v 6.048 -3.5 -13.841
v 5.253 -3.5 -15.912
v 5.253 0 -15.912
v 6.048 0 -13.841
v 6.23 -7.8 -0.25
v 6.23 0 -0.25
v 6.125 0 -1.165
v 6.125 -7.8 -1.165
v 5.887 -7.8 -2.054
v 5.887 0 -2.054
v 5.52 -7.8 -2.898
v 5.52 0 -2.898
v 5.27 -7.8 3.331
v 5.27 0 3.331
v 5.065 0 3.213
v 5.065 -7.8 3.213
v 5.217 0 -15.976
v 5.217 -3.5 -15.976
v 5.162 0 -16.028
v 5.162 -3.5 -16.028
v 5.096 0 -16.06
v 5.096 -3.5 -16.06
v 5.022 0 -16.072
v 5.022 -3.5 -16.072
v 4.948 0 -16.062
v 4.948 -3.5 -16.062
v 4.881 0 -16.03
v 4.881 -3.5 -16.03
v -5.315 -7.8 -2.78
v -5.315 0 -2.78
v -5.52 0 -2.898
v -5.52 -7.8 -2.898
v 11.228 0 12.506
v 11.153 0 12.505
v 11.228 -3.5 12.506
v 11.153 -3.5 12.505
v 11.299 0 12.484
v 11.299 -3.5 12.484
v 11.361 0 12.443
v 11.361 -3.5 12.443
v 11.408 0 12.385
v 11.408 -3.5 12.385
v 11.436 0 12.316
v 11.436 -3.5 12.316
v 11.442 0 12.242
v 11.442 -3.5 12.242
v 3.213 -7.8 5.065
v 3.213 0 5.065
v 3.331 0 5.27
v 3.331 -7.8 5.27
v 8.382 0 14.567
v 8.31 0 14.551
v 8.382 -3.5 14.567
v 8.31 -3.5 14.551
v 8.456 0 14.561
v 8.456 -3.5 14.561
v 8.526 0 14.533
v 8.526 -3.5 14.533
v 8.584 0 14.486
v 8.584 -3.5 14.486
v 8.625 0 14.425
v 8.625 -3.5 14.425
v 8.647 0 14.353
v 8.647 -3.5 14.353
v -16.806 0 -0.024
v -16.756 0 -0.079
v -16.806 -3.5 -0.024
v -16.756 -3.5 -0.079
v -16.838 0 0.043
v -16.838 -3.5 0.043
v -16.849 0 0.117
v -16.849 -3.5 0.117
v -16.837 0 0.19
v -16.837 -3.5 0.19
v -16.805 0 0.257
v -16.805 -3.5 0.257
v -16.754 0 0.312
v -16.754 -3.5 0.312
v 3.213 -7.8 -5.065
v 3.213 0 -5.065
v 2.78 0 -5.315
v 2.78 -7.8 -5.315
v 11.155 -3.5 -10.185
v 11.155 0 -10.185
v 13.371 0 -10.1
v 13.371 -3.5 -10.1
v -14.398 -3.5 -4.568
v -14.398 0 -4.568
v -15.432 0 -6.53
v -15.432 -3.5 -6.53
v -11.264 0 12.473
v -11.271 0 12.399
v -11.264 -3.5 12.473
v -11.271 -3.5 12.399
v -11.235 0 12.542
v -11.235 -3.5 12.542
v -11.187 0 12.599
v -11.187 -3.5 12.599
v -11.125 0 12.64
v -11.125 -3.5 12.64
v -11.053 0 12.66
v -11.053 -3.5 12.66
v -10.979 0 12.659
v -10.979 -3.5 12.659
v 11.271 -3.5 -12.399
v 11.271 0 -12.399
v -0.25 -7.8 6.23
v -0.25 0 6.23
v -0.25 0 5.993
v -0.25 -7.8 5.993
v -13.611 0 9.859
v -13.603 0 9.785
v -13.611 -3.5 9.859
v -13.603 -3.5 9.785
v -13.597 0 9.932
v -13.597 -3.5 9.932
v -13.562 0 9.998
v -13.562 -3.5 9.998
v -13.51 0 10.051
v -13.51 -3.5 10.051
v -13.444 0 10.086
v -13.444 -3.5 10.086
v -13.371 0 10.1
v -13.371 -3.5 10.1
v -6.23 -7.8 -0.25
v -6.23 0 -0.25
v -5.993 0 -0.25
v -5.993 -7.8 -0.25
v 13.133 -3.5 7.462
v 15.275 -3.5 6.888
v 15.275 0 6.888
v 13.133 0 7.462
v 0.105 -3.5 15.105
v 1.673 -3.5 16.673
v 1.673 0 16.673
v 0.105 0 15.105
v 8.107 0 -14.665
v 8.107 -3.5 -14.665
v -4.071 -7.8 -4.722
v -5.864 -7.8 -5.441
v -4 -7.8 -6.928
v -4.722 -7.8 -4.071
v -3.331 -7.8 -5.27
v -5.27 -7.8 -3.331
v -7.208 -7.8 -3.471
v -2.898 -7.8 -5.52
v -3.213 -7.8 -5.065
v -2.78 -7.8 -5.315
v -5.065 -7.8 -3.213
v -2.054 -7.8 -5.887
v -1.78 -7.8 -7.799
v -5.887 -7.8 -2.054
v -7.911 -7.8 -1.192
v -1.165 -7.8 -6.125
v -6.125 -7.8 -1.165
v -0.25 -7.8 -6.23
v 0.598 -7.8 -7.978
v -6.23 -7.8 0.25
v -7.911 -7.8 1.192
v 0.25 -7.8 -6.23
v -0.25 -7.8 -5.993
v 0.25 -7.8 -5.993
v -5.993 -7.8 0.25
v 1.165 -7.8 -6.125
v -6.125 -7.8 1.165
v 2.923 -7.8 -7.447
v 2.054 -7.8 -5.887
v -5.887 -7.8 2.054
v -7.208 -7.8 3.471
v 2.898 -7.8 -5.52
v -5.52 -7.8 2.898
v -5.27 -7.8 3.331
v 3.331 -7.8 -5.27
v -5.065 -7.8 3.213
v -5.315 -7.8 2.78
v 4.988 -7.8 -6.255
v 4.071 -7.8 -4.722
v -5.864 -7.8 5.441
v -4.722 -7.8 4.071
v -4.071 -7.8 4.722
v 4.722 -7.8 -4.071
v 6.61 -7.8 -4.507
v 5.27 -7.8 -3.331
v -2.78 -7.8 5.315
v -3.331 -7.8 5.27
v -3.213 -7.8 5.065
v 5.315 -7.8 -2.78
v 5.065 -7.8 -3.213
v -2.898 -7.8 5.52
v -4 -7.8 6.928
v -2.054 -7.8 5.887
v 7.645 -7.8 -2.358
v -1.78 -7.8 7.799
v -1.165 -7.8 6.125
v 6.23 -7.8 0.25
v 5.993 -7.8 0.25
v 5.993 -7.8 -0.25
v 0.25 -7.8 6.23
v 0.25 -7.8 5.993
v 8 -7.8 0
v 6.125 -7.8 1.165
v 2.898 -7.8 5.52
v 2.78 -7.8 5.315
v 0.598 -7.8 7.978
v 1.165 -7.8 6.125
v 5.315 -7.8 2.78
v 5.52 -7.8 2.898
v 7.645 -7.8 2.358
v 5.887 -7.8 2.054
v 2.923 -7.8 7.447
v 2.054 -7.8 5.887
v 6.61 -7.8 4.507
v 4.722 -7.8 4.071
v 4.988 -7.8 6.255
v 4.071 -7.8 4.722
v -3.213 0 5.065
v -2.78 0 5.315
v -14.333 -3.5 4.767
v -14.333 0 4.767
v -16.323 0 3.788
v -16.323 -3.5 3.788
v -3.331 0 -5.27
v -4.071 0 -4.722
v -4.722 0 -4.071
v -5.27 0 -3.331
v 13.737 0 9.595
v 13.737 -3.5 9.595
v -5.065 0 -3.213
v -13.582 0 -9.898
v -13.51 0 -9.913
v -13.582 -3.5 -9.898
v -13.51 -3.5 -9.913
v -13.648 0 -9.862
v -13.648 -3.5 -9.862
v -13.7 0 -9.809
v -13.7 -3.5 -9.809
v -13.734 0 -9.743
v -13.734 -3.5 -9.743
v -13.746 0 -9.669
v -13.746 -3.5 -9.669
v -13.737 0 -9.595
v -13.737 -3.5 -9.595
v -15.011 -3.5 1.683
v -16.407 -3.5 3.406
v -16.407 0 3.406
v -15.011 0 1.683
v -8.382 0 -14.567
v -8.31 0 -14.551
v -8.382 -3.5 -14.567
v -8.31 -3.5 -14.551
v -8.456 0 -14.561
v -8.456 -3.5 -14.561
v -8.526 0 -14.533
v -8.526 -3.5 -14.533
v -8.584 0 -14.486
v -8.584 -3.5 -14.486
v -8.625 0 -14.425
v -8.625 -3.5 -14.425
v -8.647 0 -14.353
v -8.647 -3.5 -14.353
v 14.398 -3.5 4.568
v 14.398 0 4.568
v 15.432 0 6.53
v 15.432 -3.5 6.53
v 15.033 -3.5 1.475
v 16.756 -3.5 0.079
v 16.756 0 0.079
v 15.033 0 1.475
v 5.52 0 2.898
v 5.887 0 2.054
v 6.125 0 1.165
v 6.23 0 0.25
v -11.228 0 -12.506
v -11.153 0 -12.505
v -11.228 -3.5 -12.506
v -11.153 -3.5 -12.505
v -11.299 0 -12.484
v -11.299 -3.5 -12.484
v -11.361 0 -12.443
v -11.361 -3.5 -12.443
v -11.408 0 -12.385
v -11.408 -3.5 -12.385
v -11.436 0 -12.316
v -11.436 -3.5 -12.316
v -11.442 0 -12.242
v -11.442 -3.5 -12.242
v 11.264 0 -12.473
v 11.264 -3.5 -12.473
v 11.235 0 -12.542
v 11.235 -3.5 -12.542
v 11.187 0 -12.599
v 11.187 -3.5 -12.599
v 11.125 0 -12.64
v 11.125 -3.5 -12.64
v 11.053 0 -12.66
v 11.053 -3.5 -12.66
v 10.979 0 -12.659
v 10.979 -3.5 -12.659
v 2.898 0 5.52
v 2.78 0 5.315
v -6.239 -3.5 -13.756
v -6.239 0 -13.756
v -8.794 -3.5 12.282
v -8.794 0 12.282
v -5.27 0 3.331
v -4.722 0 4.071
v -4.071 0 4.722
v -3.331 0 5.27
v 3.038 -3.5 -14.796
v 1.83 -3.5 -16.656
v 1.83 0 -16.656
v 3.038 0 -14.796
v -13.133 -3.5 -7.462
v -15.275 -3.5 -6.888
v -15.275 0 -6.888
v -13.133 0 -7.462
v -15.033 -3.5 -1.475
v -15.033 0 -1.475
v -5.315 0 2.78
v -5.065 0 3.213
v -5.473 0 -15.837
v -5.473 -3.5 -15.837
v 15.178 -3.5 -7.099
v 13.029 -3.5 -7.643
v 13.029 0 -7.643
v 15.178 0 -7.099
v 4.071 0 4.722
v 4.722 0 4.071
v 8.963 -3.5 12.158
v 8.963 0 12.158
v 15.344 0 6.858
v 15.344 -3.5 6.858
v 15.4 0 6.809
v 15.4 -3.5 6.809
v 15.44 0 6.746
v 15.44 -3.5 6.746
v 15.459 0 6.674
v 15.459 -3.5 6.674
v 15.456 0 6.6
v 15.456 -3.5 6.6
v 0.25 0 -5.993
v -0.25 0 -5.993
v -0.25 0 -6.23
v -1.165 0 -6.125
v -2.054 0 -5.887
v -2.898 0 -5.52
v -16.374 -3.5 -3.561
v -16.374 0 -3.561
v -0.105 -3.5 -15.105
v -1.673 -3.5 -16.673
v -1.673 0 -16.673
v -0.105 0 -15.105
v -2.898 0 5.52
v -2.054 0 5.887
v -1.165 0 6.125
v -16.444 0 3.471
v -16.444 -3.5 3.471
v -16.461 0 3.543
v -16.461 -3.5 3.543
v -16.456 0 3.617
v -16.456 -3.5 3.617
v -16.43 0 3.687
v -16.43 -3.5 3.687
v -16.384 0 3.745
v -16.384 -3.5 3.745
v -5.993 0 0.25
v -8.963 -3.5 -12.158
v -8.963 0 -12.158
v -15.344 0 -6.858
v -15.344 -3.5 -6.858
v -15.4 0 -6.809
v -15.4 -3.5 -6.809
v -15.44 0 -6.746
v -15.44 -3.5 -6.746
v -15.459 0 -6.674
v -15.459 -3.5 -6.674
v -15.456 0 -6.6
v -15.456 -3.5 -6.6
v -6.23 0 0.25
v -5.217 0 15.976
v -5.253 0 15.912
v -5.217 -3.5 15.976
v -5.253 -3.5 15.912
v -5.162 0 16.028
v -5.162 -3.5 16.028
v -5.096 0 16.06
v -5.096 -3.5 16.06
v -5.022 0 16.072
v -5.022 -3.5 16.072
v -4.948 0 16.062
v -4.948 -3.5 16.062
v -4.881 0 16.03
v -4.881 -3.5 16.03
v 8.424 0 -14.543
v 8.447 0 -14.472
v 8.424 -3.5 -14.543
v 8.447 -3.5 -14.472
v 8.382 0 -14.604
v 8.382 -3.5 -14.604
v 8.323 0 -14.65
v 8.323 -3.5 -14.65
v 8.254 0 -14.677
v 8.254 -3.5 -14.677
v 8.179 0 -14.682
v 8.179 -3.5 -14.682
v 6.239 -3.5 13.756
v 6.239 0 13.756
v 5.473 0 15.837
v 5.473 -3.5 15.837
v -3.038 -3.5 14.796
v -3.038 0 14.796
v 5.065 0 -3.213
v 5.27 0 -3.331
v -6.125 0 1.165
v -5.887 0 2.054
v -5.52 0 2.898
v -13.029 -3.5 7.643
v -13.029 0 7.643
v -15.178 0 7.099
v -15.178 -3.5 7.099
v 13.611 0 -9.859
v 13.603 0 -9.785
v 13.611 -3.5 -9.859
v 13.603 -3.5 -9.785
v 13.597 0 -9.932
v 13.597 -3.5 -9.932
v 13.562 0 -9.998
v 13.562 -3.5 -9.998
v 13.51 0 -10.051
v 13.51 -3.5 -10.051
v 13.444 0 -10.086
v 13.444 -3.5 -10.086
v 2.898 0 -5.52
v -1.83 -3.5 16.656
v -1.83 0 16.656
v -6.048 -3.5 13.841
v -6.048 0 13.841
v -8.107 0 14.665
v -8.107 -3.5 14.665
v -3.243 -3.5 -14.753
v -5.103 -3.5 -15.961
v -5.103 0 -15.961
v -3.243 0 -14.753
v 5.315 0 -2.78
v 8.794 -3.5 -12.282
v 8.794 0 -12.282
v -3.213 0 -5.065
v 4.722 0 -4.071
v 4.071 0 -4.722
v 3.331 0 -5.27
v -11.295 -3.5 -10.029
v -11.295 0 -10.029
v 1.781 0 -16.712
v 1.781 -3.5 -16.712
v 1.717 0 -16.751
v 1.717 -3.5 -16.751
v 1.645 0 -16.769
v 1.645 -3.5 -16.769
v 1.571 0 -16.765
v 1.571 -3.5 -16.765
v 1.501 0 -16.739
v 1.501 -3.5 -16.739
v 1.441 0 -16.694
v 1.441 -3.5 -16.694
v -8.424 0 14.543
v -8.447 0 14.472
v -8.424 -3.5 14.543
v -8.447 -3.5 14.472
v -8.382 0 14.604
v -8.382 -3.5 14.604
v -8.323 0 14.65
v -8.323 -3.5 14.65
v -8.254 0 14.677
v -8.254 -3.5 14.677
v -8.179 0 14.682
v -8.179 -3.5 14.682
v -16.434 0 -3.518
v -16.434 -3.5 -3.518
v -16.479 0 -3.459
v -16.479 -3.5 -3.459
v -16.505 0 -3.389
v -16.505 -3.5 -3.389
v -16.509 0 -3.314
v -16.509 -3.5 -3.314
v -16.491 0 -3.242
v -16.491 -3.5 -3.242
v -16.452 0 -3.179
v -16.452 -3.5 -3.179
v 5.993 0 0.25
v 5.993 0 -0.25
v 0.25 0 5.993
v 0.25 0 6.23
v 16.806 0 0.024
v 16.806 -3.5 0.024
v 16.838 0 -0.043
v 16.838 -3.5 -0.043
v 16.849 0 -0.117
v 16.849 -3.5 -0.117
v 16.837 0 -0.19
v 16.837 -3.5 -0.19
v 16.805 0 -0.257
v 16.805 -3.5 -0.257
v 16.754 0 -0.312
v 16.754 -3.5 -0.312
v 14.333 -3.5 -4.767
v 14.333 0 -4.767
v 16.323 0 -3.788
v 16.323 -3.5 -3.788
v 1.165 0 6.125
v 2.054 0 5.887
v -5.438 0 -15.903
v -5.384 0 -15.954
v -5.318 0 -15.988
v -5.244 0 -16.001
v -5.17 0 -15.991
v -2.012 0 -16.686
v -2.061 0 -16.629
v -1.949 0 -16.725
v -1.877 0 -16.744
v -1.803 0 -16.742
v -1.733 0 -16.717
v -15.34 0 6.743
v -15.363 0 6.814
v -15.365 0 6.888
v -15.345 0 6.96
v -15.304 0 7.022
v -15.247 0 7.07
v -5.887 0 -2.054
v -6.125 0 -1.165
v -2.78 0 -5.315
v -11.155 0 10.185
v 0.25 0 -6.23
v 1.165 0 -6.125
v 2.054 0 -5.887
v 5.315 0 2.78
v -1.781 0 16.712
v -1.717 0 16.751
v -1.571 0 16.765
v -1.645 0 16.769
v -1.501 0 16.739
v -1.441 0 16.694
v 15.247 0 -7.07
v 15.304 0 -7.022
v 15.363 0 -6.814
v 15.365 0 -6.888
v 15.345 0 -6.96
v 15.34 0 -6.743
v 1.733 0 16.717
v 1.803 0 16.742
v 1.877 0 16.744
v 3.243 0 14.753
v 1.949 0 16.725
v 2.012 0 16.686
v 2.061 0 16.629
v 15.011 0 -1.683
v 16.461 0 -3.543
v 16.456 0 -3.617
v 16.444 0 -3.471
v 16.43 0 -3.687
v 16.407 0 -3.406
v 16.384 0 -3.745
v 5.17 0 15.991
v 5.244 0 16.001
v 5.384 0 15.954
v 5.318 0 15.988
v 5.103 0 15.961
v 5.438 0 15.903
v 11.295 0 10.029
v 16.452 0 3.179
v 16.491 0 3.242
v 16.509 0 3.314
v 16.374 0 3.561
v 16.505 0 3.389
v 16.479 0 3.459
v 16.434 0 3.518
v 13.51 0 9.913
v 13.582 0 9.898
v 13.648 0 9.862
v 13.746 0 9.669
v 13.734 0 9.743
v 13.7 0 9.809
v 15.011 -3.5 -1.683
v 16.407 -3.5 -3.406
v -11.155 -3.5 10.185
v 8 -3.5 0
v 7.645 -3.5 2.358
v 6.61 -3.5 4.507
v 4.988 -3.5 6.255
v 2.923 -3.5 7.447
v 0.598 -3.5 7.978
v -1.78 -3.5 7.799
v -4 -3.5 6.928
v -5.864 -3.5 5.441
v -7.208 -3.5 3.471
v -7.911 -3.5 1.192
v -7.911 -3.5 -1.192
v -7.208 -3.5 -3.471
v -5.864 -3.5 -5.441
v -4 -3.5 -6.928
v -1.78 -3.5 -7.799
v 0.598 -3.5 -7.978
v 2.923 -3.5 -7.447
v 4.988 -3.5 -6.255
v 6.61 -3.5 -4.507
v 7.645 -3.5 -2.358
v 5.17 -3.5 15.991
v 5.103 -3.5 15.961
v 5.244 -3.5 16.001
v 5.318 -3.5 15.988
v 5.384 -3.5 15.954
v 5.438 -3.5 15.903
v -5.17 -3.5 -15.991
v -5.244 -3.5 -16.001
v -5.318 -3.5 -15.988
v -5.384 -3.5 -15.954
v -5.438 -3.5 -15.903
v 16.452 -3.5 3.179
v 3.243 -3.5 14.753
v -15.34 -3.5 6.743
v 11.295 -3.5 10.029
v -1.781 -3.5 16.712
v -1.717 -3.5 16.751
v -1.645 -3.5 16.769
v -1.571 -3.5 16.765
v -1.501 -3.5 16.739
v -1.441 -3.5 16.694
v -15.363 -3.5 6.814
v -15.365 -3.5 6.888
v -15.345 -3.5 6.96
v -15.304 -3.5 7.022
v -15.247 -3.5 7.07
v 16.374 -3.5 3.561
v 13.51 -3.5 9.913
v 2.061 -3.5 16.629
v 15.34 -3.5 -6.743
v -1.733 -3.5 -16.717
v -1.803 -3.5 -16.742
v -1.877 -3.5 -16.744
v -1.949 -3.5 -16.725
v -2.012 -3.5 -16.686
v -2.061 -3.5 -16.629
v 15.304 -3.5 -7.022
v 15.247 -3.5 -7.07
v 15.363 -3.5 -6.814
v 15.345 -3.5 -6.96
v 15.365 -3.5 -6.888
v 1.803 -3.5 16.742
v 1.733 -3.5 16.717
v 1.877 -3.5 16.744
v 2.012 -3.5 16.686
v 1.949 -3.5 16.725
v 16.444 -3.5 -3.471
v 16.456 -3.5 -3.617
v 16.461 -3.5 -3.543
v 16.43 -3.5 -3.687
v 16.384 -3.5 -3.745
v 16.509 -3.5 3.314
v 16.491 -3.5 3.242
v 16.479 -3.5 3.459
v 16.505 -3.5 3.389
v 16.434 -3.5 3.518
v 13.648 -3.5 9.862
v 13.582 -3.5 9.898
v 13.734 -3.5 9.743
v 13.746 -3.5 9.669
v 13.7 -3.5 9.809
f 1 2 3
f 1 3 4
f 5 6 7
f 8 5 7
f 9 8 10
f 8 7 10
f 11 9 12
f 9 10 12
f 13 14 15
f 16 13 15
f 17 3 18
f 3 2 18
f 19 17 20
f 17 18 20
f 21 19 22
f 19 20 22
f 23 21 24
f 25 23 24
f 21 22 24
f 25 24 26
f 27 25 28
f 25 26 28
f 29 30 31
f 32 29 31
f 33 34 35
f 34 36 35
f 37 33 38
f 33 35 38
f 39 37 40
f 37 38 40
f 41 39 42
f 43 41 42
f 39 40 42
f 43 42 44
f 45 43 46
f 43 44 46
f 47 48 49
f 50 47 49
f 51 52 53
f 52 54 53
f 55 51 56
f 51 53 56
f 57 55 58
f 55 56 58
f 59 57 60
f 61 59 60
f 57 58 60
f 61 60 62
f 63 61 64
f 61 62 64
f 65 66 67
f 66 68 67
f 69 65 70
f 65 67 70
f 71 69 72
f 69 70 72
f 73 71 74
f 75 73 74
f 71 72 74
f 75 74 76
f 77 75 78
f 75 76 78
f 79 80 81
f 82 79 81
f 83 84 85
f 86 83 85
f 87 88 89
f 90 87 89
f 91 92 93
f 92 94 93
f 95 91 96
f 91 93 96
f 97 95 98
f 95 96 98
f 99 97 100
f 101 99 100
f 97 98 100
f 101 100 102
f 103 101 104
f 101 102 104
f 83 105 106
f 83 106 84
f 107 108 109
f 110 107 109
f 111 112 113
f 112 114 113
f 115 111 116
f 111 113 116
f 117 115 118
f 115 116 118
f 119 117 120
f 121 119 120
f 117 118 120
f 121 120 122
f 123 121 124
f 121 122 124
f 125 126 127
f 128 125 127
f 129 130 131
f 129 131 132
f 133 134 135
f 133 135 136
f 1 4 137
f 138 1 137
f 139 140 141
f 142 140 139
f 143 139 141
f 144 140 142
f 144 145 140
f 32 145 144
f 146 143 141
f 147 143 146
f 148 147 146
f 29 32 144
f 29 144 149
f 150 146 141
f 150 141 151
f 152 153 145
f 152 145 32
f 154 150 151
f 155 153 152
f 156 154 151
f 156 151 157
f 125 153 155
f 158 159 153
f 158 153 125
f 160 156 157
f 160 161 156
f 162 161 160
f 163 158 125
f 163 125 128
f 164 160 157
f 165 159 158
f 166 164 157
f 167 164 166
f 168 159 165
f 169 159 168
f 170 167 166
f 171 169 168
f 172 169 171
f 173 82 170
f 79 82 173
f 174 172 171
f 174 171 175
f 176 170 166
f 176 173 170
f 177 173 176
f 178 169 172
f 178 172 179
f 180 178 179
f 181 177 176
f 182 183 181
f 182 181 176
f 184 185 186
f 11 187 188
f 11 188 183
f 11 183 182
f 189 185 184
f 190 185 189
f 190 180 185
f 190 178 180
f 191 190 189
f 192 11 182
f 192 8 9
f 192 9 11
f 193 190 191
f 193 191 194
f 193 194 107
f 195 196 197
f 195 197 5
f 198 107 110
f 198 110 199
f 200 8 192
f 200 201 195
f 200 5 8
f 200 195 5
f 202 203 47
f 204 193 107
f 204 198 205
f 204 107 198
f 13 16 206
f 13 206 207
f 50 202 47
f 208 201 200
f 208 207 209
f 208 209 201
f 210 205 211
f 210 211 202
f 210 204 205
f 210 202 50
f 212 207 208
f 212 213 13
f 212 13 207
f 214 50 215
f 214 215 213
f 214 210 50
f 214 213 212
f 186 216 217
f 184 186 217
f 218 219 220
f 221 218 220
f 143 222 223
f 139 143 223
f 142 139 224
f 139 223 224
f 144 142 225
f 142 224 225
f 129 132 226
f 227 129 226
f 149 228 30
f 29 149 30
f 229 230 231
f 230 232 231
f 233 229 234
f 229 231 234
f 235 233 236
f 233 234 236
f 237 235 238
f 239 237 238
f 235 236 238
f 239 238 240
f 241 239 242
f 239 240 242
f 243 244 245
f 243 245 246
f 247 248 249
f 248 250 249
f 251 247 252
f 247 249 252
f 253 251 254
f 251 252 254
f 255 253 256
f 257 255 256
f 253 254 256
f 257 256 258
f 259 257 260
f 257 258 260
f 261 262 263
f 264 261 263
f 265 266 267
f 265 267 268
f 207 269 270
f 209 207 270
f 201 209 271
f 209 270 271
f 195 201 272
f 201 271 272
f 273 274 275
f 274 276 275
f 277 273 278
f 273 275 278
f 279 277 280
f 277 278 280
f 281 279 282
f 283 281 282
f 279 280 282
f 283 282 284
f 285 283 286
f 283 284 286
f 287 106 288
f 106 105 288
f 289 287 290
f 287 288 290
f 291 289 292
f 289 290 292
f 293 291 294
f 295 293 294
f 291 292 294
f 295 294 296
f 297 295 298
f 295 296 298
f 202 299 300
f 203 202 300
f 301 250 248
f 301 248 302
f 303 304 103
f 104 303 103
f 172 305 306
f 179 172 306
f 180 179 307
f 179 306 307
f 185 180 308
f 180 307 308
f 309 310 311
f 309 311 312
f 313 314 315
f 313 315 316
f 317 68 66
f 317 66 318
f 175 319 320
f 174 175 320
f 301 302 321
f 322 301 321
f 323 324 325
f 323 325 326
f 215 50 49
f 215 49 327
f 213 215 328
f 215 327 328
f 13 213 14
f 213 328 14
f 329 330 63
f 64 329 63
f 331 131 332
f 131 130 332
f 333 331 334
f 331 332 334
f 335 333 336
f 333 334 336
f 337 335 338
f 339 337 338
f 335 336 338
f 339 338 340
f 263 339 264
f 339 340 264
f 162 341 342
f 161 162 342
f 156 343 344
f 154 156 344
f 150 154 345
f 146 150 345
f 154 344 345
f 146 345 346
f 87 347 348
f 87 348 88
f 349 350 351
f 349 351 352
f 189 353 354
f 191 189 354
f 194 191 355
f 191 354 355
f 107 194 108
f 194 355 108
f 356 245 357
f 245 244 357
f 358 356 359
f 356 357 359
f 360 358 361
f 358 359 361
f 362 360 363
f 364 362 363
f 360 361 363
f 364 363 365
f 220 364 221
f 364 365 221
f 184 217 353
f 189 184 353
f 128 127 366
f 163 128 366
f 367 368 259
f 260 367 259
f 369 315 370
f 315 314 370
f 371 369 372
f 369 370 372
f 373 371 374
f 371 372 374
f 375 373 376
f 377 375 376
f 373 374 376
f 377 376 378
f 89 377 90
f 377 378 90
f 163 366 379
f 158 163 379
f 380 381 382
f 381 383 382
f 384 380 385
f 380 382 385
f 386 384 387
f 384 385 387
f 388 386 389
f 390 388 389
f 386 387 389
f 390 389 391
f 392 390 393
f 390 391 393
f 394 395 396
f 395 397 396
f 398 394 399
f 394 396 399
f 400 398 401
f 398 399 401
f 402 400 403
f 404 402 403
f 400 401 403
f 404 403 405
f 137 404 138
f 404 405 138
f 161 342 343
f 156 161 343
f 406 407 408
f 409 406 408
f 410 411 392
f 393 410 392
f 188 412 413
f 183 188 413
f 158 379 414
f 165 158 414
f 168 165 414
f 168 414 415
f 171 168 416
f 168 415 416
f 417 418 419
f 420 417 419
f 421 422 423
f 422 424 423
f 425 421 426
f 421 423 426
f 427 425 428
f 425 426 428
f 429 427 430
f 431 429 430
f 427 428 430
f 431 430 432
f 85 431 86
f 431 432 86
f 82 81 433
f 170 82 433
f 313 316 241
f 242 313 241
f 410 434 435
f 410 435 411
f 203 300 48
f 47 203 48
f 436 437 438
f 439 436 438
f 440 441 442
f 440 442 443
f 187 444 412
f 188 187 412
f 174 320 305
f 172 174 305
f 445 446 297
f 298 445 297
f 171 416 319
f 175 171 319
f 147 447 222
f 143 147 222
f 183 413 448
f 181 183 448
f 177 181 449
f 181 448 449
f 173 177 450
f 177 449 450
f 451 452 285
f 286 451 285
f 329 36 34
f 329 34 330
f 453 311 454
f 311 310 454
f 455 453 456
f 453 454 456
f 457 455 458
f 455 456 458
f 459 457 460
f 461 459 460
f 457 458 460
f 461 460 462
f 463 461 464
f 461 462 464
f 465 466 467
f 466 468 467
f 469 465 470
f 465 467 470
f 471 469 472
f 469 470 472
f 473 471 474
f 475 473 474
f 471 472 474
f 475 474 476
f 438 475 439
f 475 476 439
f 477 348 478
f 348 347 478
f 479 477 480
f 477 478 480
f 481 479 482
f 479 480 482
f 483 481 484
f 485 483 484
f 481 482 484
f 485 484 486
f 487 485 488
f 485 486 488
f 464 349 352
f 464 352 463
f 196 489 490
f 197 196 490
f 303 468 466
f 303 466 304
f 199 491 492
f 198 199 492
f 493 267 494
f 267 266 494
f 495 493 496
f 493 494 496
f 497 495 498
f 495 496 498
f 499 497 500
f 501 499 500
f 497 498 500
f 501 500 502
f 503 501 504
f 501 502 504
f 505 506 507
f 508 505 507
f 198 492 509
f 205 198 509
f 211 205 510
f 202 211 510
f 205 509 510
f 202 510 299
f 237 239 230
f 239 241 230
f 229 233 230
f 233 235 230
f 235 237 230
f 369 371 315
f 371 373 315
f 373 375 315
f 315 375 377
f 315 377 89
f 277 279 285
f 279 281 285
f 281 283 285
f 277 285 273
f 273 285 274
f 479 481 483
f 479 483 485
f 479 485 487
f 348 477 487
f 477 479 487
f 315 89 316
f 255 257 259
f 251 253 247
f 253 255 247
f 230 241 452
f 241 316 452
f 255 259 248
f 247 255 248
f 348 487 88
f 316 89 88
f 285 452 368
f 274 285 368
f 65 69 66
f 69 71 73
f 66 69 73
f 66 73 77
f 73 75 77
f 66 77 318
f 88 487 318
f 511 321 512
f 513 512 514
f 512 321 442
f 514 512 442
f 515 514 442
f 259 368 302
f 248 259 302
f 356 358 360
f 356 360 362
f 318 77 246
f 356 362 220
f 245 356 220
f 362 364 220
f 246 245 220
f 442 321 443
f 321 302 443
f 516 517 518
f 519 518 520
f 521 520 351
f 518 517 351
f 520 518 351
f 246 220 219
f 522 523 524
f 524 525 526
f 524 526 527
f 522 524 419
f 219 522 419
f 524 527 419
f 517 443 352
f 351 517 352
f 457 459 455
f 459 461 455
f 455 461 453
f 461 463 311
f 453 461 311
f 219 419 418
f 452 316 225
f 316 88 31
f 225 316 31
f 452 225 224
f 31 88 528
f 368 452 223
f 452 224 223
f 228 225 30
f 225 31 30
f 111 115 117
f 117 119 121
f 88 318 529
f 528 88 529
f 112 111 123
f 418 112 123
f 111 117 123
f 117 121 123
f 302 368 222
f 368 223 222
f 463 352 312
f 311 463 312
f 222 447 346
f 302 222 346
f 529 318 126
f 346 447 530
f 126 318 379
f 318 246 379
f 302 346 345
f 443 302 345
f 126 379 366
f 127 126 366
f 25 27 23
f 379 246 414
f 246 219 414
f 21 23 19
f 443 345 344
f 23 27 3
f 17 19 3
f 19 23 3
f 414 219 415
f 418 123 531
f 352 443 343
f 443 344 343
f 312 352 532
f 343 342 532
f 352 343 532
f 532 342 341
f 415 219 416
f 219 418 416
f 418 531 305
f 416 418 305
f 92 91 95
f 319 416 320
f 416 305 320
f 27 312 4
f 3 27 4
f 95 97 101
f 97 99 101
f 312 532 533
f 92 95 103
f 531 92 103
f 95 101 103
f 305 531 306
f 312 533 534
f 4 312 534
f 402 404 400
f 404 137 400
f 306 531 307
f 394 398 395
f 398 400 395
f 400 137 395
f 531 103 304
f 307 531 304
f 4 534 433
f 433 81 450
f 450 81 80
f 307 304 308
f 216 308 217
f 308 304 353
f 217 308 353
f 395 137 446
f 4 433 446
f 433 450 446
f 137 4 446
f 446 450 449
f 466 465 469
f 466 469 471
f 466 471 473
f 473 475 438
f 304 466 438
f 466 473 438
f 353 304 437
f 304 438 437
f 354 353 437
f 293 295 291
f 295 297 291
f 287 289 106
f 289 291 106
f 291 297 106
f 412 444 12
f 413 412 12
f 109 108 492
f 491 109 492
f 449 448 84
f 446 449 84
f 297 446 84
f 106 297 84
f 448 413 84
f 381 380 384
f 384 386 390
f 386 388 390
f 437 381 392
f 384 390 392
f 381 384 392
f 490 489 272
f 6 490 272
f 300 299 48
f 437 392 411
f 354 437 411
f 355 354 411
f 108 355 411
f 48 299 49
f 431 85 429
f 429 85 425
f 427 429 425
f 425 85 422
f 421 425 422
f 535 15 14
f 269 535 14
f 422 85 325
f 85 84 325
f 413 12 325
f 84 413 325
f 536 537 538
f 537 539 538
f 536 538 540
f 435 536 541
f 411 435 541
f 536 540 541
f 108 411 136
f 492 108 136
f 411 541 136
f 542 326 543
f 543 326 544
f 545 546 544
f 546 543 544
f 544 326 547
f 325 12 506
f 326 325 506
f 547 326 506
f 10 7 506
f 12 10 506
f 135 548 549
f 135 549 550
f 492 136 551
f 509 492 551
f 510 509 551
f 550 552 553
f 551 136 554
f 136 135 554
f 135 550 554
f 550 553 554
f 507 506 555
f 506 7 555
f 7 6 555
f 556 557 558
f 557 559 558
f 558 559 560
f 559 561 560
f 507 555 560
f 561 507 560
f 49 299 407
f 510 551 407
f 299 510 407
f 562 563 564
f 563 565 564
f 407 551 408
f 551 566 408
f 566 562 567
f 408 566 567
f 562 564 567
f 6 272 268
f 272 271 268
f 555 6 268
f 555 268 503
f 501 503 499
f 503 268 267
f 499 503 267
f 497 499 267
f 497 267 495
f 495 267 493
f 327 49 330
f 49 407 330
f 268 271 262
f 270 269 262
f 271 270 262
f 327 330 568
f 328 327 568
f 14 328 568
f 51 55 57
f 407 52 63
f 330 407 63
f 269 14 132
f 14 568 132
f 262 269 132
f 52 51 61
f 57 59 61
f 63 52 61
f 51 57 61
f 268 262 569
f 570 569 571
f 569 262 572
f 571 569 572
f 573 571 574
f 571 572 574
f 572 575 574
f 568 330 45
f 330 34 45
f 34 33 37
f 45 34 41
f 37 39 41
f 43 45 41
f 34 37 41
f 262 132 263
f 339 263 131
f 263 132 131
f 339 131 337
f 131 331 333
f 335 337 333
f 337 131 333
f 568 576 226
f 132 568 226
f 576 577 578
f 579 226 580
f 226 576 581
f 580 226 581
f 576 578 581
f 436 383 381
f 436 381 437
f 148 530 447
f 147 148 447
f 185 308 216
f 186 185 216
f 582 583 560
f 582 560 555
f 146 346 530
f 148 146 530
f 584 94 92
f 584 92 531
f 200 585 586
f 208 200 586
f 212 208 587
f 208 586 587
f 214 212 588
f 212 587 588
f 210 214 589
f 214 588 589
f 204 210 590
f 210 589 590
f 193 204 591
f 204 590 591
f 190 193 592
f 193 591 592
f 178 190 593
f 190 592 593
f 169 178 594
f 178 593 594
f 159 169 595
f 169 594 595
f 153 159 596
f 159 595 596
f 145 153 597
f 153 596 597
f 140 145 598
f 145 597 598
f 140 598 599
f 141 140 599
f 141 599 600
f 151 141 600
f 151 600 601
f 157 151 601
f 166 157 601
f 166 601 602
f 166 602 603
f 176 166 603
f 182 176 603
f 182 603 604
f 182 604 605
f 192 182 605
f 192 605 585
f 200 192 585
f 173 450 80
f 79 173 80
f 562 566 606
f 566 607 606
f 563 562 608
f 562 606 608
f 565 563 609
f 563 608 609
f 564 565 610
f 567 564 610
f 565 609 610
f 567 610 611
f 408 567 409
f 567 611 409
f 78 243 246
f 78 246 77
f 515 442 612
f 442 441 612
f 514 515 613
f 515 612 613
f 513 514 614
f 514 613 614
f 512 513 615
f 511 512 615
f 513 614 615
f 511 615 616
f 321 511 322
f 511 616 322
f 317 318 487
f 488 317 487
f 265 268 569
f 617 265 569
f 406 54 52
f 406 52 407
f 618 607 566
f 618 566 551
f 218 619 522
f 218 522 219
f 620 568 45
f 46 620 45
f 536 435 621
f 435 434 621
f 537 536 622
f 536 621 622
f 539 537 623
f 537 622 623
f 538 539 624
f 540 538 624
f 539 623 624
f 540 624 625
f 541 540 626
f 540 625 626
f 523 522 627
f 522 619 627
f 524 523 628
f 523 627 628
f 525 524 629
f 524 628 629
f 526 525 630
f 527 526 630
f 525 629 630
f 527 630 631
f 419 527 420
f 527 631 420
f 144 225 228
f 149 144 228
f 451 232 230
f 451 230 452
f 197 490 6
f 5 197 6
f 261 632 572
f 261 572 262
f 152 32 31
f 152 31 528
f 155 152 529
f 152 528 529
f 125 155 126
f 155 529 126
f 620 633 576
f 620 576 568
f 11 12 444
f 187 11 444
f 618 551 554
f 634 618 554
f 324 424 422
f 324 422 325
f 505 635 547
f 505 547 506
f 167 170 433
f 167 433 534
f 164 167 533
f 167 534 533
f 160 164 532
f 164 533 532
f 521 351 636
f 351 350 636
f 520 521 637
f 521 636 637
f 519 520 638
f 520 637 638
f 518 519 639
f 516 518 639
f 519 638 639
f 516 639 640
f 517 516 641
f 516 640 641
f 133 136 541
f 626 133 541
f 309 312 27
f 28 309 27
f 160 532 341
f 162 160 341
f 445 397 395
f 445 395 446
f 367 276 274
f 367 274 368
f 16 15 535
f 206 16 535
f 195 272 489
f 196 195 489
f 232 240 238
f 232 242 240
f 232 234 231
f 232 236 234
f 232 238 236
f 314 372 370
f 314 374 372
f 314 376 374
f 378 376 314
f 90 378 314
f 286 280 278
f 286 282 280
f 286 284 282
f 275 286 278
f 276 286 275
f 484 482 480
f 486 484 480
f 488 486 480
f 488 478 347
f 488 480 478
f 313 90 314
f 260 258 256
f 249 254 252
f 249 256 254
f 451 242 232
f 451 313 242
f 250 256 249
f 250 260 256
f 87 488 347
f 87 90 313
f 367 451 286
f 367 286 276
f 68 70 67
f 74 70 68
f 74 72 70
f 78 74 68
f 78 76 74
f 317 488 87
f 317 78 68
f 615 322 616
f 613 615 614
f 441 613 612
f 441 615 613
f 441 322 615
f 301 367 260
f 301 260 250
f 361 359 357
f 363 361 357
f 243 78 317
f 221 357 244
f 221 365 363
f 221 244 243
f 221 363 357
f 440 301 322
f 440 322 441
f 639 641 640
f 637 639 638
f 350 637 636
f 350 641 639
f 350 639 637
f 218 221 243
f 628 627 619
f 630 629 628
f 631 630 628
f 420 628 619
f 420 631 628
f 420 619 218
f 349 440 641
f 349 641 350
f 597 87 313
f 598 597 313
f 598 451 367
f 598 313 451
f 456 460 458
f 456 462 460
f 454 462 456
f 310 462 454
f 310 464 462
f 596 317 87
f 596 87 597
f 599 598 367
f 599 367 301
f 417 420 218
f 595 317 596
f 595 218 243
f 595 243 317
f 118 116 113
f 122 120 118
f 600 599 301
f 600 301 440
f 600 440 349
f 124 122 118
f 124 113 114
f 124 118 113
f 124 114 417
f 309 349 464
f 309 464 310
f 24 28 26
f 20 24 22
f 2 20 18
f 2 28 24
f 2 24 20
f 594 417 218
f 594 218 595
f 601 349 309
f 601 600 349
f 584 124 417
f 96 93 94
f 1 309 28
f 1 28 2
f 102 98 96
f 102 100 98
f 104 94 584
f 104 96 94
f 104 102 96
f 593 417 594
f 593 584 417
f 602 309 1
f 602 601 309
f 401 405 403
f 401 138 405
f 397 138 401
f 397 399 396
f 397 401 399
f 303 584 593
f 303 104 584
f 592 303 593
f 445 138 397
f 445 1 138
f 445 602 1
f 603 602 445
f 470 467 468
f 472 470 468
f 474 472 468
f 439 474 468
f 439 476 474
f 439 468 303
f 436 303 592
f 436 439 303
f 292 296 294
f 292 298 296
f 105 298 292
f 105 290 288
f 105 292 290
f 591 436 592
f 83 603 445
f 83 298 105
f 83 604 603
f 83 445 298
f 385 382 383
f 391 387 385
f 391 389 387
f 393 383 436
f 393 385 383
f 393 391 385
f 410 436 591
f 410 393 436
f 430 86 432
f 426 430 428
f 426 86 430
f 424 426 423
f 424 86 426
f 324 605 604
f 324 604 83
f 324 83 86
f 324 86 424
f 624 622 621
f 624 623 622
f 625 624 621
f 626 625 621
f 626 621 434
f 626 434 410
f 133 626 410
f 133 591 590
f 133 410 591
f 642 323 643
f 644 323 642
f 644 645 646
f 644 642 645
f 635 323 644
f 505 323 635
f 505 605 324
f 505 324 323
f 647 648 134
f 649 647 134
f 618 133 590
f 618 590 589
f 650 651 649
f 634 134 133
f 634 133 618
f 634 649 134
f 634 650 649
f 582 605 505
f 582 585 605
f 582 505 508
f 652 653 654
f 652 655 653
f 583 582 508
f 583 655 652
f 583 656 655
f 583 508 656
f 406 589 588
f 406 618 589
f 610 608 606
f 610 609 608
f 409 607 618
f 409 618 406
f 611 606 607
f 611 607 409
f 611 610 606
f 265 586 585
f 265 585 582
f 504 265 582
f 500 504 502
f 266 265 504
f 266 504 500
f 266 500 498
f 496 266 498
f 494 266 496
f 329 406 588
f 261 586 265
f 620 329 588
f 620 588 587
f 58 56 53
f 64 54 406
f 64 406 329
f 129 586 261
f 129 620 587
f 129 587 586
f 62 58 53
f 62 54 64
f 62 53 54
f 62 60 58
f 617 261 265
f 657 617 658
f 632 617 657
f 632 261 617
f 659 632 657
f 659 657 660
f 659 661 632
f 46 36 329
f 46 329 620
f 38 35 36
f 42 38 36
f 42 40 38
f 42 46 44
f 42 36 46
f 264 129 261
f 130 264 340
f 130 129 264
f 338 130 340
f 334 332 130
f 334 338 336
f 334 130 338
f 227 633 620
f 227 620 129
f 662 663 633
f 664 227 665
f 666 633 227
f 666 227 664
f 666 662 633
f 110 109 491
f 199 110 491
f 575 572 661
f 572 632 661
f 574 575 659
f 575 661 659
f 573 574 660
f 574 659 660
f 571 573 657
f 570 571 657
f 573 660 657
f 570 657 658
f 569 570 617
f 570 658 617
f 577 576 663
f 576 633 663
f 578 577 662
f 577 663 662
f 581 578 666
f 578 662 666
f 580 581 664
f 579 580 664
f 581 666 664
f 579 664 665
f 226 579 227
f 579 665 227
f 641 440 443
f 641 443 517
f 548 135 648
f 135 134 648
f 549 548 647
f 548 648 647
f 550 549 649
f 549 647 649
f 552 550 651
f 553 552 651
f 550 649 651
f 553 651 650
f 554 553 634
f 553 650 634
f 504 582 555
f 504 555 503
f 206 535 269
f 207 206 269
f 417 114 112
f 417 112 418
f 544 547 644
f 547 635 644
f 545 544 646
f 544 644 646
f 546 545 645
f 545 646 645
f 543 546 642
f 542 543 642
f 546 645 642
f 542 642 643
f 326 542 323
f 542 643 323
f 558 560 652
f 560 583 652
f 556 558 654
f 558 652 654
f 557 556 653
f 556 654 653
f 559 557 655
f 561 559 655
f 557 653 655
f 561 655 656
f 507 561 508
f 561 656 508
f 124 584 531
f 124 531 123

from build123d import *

# Parameters (mm, degrees)
F0_R     = 8
F1_DEPTH = 7.8
F0_R_2   = 15
F2_DEPTH = 3.5
F3_DEPTH = 7.8
F4_COUNT = 12
F6_DEPTH = 3.5
F8_R     = 0.25
F9_COUNT = 30


with BuildPart() as f1:
    # F0 (on Front) → F1 (new body)
    with BuildSketch(Plane.XZ):
        Circle(F0_R)
        with BuildLine():
            ThreePointArc((0.25, 6.229985955), (4.4963304483, 4.3195182023), (6.235, 0))
            ThreePointArc((6.235, 0), (-4.3195182023, -4.4963304483), (-0.25, 6.229985955))
            ThreePointArc((-0.25, 6.229985955), (0, 6.235), (0.25, 6.229985955))
        make_face(mode=Mode.SUBTRACT)
    extrude(amount=F1_DEPTH)

    # F0 (on Front) → F2 (join)
    with BuildSketch(Plane.XZ):
        Circle(F0_R_2)
        Circle(F0_R, mode=Mode.SUBTRACT)
    extrude(amount=F2_DEPTH)

    # F4: F3 ×12 about axis
    f4_axis = Axis((0, 0, 0), (0, -1, 0))


with BuildPart() as f3:
    # F0 (on Front) → F3 (new body)
    with BuildSketch(Plane.XZ):
        with BuildLine():
            Line((0.25, 5.993085955), (0.25, 6.229985955))
            ThreePointArc((0.25, 6.229985955), (0, 6.235), (-0.25, 6.229985955))
            Line((-0.25, 6.229985955), (-0.25, 5.993085955))
            Line((-0.25, 5.993085955), (0.25, 5.993085955))
        make_face()
    extrude(amount=F3_DEPTH)


with BuildPart() as f1_1:
    add(f1.part)
    for i in range(1, F4_COUNT):
        add(f3.part.rotate(f4_axis, i * 360 / F4_COUNT))



with BuildPart() as f6:
    # F5 (on Front) → F6 (new body)
    with BuildSketch(Plane.XZ):
        with BuildLine():
            Line((1.894147114, 16.894147114), (0, 15))
            ThreePointArc((0, 15), (1.6713062771, 14.9066003947), (3.321799308, 14.6275647104))
            Line((3.321799308, 14.6275647104), (1.894147114, 16.894147114))
        make_face()
    extrude(amount=F6_DEPTH)

    # F8
    f8_edges = [f6.edges().sort_by_distance(p)[0] for p in [
        (1.894147, -1.75, 16.894147),
    ]]
    fillet(f8_edges, radius=F8_R)


with BuildPart() as f1_2:
    add(f1_1.part)

    add(f3.part)  # F9 merges F3

    add(f6.part)  # F9 merges F6
    # F9: F6 ×30 about axis
    f9_axis = Axis((0, -8.9512197301, 0), (0, -1, 0))
    for i in range(1, F9_COUNT):
        add(f6.part.rotate(f9_axis, i * 360 / F9_COUNT))


solid = f1_2.part
